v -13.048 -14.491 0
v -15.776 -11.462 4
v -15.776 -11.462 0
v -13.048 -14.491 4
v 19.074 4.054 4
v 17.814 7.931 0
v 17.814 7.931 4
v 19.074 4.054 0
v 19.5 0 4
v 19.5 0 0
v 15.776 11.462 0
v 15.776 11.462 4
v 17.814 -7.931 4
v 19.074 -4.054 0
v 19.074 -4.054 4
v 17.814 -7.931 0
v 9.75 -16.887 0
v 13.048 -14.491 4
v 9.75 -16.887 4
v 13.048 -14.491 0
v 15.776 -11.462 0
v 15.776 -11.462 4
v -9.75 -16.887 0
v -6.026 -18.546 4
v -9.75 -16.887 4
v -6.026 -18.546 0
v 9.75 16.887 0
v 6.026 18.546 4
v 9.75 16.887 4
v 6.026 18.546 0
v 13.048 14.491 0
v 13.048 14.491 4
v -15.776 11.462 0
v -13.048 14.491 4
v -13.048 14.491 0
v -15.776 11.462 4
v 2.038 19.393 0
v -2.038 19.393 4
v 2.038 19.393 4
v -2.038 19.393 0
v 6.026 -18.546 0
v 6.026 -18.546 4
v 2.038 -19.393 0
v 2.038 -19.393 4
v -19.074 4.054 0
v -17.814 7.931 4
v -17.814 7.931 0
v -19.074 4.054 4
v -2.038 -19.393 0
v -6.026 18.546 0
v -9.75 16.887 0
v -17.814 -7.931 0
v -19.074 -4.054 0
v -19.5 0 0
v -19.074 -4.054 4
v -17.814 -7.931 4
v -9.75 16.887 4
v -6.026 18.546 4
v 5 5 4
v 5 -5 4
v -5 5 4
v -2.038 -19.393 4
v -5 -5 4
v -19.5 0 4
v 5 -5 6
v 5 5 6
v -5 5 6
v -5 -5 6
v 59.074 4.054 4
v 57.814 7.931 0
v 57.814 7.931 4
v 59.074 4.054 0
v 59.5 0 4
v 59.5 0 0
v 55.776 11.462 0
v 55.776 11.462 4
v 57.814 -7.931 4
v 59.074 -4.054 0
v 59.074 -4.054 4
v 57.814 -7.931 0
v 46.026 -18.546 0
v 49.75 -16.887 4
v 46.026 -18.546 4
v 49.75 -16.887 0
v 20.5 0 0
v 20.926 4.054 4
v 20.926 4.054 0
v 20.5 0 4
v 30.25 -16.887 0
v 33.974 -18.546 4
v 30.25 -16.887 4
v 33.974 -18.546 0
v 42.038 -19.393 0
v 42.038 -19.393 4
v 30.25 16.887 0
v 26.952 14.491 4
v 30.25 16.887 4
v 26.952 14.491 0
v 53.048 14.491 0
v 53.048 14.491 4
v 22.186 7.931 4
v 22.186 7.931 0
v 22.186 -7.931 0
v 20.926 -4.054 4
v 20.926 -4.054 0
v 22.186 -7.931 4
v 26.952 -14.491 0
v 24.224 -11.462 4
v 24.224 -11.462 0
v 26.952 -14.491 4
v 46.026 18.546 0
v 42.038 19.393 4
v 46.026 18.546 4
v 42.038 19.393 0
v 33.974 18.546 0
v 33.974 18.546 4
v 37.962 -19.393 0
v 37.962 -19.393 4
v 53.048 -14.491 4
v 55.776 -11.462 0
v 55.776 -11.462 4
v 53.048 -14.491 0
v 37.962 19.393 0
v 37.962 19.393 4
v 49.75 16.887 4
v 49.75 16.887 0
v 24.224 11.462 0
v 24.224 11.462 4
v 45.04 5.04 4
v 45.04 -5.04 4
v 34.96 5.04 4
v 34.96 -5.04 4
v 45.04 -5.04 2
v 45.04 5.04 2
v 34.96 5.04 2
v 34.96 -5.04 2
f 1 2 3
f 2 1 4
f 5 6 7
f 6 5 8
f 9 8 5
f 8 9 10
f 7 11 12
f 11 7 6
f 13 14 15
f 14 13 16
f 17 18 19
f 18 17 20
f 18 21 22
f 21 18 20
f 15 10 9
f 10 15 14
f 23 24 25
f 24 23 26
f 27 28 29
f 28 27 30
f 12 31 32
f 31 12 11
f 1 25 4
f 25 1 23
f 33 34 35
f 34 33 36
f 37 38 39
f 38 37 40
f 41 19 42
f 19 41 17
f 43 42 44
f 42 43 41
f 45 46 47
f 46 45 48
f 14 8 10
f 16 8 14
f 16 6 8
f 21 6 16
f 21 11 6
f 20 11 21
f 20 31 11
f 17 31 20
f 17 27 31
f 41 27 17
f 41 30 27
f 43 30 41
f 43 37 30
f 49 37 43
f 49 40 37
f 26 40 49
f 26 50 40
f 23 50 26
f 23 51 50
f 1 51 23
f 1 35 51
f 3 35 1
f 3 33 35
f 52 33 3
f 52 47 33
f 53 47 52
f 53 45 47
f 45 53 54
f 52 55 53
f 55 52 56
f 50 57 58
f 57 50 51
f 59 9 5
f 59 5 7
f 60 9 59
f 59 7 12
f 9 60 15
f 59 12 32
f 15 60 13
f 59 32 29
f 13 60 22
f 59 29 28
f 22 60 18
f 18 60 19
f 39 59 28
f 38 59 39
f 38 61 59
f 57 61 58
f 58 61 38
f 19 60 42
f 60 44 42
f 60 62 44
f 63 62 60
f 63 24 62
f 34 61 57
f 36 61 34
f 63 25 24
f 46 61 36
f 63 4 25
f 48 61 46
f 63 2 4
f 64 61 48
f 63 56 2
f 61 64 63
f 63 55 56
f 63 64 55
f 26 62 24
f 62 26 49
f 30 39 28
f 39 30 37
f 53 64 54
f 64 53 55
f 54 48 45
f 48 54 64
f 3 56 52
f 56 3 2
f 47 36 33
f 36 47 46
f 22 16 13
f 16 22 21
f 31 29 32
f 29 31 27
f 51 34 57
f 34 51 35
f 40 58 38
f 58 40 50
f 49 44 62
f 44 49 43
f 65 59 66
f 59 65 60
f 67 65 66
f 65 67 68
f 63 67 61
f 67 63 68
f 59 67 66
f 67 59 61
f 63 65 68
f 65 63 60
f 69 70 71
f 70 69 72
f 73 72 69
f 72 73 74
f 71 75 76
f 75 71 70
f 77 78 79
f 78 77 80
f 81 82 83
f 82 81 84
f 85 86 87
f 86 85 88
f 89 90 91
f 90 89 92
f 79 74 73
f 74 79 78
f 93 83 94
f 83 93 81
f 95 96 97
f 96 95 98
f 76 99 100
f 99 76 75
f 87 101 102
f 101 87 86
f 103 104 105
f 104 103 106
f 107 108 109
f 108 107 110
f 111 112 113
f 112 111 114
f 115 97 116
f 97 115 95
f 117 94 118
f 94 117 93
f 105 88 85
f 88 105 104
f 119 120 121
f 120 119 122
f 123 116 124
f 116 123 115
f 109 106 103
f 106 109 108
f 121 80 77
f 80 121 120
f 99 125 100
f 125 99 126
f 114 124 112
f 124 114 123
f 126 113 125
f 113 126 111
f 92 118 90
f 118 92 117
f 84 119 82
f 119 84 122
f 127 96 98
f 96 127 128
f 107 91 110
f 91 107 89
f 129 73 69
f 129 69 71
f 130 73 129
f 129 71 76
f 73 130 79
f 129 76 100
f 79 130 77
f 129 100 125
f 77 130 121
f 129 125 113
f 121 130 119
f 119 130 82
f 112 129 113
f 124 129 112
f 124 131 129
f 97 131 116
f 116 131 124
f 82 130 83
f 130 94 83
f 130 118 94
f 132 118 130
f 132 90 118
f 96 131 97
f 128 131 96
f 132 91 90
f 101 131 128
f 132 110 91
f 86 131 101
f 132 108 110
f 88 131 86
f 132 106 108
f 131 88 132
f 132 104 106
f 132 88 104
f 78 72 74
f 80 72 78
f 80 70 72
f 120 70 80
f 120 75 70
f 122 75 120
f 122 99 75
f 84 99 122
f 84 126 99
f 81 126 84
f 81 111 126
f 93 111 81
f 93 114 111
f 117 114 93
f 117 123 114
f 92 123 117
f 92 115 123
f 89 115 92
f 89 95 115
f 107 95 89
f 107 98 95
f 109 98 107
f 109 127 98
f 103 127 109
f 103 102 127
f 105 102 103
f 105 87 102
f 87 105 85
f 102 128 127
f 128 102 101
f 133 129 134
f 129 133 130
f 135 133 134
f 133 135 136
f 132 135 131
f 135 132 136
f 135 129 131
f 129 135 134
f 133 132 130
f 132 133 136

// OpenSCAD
3dp_error=0.08;

union(){
    cylinder(d=39,h=4);
    
    translate([0, 0, 4])
    cube([10,10,4],center=true);
}
 difference(){
    translate([40,0,0])
    cylinder(d=39,h = 4);
    translate([40,0, 7])
    cube([10 + 3dp_error, 
    10+3dp_error,10],center=true);
 }
